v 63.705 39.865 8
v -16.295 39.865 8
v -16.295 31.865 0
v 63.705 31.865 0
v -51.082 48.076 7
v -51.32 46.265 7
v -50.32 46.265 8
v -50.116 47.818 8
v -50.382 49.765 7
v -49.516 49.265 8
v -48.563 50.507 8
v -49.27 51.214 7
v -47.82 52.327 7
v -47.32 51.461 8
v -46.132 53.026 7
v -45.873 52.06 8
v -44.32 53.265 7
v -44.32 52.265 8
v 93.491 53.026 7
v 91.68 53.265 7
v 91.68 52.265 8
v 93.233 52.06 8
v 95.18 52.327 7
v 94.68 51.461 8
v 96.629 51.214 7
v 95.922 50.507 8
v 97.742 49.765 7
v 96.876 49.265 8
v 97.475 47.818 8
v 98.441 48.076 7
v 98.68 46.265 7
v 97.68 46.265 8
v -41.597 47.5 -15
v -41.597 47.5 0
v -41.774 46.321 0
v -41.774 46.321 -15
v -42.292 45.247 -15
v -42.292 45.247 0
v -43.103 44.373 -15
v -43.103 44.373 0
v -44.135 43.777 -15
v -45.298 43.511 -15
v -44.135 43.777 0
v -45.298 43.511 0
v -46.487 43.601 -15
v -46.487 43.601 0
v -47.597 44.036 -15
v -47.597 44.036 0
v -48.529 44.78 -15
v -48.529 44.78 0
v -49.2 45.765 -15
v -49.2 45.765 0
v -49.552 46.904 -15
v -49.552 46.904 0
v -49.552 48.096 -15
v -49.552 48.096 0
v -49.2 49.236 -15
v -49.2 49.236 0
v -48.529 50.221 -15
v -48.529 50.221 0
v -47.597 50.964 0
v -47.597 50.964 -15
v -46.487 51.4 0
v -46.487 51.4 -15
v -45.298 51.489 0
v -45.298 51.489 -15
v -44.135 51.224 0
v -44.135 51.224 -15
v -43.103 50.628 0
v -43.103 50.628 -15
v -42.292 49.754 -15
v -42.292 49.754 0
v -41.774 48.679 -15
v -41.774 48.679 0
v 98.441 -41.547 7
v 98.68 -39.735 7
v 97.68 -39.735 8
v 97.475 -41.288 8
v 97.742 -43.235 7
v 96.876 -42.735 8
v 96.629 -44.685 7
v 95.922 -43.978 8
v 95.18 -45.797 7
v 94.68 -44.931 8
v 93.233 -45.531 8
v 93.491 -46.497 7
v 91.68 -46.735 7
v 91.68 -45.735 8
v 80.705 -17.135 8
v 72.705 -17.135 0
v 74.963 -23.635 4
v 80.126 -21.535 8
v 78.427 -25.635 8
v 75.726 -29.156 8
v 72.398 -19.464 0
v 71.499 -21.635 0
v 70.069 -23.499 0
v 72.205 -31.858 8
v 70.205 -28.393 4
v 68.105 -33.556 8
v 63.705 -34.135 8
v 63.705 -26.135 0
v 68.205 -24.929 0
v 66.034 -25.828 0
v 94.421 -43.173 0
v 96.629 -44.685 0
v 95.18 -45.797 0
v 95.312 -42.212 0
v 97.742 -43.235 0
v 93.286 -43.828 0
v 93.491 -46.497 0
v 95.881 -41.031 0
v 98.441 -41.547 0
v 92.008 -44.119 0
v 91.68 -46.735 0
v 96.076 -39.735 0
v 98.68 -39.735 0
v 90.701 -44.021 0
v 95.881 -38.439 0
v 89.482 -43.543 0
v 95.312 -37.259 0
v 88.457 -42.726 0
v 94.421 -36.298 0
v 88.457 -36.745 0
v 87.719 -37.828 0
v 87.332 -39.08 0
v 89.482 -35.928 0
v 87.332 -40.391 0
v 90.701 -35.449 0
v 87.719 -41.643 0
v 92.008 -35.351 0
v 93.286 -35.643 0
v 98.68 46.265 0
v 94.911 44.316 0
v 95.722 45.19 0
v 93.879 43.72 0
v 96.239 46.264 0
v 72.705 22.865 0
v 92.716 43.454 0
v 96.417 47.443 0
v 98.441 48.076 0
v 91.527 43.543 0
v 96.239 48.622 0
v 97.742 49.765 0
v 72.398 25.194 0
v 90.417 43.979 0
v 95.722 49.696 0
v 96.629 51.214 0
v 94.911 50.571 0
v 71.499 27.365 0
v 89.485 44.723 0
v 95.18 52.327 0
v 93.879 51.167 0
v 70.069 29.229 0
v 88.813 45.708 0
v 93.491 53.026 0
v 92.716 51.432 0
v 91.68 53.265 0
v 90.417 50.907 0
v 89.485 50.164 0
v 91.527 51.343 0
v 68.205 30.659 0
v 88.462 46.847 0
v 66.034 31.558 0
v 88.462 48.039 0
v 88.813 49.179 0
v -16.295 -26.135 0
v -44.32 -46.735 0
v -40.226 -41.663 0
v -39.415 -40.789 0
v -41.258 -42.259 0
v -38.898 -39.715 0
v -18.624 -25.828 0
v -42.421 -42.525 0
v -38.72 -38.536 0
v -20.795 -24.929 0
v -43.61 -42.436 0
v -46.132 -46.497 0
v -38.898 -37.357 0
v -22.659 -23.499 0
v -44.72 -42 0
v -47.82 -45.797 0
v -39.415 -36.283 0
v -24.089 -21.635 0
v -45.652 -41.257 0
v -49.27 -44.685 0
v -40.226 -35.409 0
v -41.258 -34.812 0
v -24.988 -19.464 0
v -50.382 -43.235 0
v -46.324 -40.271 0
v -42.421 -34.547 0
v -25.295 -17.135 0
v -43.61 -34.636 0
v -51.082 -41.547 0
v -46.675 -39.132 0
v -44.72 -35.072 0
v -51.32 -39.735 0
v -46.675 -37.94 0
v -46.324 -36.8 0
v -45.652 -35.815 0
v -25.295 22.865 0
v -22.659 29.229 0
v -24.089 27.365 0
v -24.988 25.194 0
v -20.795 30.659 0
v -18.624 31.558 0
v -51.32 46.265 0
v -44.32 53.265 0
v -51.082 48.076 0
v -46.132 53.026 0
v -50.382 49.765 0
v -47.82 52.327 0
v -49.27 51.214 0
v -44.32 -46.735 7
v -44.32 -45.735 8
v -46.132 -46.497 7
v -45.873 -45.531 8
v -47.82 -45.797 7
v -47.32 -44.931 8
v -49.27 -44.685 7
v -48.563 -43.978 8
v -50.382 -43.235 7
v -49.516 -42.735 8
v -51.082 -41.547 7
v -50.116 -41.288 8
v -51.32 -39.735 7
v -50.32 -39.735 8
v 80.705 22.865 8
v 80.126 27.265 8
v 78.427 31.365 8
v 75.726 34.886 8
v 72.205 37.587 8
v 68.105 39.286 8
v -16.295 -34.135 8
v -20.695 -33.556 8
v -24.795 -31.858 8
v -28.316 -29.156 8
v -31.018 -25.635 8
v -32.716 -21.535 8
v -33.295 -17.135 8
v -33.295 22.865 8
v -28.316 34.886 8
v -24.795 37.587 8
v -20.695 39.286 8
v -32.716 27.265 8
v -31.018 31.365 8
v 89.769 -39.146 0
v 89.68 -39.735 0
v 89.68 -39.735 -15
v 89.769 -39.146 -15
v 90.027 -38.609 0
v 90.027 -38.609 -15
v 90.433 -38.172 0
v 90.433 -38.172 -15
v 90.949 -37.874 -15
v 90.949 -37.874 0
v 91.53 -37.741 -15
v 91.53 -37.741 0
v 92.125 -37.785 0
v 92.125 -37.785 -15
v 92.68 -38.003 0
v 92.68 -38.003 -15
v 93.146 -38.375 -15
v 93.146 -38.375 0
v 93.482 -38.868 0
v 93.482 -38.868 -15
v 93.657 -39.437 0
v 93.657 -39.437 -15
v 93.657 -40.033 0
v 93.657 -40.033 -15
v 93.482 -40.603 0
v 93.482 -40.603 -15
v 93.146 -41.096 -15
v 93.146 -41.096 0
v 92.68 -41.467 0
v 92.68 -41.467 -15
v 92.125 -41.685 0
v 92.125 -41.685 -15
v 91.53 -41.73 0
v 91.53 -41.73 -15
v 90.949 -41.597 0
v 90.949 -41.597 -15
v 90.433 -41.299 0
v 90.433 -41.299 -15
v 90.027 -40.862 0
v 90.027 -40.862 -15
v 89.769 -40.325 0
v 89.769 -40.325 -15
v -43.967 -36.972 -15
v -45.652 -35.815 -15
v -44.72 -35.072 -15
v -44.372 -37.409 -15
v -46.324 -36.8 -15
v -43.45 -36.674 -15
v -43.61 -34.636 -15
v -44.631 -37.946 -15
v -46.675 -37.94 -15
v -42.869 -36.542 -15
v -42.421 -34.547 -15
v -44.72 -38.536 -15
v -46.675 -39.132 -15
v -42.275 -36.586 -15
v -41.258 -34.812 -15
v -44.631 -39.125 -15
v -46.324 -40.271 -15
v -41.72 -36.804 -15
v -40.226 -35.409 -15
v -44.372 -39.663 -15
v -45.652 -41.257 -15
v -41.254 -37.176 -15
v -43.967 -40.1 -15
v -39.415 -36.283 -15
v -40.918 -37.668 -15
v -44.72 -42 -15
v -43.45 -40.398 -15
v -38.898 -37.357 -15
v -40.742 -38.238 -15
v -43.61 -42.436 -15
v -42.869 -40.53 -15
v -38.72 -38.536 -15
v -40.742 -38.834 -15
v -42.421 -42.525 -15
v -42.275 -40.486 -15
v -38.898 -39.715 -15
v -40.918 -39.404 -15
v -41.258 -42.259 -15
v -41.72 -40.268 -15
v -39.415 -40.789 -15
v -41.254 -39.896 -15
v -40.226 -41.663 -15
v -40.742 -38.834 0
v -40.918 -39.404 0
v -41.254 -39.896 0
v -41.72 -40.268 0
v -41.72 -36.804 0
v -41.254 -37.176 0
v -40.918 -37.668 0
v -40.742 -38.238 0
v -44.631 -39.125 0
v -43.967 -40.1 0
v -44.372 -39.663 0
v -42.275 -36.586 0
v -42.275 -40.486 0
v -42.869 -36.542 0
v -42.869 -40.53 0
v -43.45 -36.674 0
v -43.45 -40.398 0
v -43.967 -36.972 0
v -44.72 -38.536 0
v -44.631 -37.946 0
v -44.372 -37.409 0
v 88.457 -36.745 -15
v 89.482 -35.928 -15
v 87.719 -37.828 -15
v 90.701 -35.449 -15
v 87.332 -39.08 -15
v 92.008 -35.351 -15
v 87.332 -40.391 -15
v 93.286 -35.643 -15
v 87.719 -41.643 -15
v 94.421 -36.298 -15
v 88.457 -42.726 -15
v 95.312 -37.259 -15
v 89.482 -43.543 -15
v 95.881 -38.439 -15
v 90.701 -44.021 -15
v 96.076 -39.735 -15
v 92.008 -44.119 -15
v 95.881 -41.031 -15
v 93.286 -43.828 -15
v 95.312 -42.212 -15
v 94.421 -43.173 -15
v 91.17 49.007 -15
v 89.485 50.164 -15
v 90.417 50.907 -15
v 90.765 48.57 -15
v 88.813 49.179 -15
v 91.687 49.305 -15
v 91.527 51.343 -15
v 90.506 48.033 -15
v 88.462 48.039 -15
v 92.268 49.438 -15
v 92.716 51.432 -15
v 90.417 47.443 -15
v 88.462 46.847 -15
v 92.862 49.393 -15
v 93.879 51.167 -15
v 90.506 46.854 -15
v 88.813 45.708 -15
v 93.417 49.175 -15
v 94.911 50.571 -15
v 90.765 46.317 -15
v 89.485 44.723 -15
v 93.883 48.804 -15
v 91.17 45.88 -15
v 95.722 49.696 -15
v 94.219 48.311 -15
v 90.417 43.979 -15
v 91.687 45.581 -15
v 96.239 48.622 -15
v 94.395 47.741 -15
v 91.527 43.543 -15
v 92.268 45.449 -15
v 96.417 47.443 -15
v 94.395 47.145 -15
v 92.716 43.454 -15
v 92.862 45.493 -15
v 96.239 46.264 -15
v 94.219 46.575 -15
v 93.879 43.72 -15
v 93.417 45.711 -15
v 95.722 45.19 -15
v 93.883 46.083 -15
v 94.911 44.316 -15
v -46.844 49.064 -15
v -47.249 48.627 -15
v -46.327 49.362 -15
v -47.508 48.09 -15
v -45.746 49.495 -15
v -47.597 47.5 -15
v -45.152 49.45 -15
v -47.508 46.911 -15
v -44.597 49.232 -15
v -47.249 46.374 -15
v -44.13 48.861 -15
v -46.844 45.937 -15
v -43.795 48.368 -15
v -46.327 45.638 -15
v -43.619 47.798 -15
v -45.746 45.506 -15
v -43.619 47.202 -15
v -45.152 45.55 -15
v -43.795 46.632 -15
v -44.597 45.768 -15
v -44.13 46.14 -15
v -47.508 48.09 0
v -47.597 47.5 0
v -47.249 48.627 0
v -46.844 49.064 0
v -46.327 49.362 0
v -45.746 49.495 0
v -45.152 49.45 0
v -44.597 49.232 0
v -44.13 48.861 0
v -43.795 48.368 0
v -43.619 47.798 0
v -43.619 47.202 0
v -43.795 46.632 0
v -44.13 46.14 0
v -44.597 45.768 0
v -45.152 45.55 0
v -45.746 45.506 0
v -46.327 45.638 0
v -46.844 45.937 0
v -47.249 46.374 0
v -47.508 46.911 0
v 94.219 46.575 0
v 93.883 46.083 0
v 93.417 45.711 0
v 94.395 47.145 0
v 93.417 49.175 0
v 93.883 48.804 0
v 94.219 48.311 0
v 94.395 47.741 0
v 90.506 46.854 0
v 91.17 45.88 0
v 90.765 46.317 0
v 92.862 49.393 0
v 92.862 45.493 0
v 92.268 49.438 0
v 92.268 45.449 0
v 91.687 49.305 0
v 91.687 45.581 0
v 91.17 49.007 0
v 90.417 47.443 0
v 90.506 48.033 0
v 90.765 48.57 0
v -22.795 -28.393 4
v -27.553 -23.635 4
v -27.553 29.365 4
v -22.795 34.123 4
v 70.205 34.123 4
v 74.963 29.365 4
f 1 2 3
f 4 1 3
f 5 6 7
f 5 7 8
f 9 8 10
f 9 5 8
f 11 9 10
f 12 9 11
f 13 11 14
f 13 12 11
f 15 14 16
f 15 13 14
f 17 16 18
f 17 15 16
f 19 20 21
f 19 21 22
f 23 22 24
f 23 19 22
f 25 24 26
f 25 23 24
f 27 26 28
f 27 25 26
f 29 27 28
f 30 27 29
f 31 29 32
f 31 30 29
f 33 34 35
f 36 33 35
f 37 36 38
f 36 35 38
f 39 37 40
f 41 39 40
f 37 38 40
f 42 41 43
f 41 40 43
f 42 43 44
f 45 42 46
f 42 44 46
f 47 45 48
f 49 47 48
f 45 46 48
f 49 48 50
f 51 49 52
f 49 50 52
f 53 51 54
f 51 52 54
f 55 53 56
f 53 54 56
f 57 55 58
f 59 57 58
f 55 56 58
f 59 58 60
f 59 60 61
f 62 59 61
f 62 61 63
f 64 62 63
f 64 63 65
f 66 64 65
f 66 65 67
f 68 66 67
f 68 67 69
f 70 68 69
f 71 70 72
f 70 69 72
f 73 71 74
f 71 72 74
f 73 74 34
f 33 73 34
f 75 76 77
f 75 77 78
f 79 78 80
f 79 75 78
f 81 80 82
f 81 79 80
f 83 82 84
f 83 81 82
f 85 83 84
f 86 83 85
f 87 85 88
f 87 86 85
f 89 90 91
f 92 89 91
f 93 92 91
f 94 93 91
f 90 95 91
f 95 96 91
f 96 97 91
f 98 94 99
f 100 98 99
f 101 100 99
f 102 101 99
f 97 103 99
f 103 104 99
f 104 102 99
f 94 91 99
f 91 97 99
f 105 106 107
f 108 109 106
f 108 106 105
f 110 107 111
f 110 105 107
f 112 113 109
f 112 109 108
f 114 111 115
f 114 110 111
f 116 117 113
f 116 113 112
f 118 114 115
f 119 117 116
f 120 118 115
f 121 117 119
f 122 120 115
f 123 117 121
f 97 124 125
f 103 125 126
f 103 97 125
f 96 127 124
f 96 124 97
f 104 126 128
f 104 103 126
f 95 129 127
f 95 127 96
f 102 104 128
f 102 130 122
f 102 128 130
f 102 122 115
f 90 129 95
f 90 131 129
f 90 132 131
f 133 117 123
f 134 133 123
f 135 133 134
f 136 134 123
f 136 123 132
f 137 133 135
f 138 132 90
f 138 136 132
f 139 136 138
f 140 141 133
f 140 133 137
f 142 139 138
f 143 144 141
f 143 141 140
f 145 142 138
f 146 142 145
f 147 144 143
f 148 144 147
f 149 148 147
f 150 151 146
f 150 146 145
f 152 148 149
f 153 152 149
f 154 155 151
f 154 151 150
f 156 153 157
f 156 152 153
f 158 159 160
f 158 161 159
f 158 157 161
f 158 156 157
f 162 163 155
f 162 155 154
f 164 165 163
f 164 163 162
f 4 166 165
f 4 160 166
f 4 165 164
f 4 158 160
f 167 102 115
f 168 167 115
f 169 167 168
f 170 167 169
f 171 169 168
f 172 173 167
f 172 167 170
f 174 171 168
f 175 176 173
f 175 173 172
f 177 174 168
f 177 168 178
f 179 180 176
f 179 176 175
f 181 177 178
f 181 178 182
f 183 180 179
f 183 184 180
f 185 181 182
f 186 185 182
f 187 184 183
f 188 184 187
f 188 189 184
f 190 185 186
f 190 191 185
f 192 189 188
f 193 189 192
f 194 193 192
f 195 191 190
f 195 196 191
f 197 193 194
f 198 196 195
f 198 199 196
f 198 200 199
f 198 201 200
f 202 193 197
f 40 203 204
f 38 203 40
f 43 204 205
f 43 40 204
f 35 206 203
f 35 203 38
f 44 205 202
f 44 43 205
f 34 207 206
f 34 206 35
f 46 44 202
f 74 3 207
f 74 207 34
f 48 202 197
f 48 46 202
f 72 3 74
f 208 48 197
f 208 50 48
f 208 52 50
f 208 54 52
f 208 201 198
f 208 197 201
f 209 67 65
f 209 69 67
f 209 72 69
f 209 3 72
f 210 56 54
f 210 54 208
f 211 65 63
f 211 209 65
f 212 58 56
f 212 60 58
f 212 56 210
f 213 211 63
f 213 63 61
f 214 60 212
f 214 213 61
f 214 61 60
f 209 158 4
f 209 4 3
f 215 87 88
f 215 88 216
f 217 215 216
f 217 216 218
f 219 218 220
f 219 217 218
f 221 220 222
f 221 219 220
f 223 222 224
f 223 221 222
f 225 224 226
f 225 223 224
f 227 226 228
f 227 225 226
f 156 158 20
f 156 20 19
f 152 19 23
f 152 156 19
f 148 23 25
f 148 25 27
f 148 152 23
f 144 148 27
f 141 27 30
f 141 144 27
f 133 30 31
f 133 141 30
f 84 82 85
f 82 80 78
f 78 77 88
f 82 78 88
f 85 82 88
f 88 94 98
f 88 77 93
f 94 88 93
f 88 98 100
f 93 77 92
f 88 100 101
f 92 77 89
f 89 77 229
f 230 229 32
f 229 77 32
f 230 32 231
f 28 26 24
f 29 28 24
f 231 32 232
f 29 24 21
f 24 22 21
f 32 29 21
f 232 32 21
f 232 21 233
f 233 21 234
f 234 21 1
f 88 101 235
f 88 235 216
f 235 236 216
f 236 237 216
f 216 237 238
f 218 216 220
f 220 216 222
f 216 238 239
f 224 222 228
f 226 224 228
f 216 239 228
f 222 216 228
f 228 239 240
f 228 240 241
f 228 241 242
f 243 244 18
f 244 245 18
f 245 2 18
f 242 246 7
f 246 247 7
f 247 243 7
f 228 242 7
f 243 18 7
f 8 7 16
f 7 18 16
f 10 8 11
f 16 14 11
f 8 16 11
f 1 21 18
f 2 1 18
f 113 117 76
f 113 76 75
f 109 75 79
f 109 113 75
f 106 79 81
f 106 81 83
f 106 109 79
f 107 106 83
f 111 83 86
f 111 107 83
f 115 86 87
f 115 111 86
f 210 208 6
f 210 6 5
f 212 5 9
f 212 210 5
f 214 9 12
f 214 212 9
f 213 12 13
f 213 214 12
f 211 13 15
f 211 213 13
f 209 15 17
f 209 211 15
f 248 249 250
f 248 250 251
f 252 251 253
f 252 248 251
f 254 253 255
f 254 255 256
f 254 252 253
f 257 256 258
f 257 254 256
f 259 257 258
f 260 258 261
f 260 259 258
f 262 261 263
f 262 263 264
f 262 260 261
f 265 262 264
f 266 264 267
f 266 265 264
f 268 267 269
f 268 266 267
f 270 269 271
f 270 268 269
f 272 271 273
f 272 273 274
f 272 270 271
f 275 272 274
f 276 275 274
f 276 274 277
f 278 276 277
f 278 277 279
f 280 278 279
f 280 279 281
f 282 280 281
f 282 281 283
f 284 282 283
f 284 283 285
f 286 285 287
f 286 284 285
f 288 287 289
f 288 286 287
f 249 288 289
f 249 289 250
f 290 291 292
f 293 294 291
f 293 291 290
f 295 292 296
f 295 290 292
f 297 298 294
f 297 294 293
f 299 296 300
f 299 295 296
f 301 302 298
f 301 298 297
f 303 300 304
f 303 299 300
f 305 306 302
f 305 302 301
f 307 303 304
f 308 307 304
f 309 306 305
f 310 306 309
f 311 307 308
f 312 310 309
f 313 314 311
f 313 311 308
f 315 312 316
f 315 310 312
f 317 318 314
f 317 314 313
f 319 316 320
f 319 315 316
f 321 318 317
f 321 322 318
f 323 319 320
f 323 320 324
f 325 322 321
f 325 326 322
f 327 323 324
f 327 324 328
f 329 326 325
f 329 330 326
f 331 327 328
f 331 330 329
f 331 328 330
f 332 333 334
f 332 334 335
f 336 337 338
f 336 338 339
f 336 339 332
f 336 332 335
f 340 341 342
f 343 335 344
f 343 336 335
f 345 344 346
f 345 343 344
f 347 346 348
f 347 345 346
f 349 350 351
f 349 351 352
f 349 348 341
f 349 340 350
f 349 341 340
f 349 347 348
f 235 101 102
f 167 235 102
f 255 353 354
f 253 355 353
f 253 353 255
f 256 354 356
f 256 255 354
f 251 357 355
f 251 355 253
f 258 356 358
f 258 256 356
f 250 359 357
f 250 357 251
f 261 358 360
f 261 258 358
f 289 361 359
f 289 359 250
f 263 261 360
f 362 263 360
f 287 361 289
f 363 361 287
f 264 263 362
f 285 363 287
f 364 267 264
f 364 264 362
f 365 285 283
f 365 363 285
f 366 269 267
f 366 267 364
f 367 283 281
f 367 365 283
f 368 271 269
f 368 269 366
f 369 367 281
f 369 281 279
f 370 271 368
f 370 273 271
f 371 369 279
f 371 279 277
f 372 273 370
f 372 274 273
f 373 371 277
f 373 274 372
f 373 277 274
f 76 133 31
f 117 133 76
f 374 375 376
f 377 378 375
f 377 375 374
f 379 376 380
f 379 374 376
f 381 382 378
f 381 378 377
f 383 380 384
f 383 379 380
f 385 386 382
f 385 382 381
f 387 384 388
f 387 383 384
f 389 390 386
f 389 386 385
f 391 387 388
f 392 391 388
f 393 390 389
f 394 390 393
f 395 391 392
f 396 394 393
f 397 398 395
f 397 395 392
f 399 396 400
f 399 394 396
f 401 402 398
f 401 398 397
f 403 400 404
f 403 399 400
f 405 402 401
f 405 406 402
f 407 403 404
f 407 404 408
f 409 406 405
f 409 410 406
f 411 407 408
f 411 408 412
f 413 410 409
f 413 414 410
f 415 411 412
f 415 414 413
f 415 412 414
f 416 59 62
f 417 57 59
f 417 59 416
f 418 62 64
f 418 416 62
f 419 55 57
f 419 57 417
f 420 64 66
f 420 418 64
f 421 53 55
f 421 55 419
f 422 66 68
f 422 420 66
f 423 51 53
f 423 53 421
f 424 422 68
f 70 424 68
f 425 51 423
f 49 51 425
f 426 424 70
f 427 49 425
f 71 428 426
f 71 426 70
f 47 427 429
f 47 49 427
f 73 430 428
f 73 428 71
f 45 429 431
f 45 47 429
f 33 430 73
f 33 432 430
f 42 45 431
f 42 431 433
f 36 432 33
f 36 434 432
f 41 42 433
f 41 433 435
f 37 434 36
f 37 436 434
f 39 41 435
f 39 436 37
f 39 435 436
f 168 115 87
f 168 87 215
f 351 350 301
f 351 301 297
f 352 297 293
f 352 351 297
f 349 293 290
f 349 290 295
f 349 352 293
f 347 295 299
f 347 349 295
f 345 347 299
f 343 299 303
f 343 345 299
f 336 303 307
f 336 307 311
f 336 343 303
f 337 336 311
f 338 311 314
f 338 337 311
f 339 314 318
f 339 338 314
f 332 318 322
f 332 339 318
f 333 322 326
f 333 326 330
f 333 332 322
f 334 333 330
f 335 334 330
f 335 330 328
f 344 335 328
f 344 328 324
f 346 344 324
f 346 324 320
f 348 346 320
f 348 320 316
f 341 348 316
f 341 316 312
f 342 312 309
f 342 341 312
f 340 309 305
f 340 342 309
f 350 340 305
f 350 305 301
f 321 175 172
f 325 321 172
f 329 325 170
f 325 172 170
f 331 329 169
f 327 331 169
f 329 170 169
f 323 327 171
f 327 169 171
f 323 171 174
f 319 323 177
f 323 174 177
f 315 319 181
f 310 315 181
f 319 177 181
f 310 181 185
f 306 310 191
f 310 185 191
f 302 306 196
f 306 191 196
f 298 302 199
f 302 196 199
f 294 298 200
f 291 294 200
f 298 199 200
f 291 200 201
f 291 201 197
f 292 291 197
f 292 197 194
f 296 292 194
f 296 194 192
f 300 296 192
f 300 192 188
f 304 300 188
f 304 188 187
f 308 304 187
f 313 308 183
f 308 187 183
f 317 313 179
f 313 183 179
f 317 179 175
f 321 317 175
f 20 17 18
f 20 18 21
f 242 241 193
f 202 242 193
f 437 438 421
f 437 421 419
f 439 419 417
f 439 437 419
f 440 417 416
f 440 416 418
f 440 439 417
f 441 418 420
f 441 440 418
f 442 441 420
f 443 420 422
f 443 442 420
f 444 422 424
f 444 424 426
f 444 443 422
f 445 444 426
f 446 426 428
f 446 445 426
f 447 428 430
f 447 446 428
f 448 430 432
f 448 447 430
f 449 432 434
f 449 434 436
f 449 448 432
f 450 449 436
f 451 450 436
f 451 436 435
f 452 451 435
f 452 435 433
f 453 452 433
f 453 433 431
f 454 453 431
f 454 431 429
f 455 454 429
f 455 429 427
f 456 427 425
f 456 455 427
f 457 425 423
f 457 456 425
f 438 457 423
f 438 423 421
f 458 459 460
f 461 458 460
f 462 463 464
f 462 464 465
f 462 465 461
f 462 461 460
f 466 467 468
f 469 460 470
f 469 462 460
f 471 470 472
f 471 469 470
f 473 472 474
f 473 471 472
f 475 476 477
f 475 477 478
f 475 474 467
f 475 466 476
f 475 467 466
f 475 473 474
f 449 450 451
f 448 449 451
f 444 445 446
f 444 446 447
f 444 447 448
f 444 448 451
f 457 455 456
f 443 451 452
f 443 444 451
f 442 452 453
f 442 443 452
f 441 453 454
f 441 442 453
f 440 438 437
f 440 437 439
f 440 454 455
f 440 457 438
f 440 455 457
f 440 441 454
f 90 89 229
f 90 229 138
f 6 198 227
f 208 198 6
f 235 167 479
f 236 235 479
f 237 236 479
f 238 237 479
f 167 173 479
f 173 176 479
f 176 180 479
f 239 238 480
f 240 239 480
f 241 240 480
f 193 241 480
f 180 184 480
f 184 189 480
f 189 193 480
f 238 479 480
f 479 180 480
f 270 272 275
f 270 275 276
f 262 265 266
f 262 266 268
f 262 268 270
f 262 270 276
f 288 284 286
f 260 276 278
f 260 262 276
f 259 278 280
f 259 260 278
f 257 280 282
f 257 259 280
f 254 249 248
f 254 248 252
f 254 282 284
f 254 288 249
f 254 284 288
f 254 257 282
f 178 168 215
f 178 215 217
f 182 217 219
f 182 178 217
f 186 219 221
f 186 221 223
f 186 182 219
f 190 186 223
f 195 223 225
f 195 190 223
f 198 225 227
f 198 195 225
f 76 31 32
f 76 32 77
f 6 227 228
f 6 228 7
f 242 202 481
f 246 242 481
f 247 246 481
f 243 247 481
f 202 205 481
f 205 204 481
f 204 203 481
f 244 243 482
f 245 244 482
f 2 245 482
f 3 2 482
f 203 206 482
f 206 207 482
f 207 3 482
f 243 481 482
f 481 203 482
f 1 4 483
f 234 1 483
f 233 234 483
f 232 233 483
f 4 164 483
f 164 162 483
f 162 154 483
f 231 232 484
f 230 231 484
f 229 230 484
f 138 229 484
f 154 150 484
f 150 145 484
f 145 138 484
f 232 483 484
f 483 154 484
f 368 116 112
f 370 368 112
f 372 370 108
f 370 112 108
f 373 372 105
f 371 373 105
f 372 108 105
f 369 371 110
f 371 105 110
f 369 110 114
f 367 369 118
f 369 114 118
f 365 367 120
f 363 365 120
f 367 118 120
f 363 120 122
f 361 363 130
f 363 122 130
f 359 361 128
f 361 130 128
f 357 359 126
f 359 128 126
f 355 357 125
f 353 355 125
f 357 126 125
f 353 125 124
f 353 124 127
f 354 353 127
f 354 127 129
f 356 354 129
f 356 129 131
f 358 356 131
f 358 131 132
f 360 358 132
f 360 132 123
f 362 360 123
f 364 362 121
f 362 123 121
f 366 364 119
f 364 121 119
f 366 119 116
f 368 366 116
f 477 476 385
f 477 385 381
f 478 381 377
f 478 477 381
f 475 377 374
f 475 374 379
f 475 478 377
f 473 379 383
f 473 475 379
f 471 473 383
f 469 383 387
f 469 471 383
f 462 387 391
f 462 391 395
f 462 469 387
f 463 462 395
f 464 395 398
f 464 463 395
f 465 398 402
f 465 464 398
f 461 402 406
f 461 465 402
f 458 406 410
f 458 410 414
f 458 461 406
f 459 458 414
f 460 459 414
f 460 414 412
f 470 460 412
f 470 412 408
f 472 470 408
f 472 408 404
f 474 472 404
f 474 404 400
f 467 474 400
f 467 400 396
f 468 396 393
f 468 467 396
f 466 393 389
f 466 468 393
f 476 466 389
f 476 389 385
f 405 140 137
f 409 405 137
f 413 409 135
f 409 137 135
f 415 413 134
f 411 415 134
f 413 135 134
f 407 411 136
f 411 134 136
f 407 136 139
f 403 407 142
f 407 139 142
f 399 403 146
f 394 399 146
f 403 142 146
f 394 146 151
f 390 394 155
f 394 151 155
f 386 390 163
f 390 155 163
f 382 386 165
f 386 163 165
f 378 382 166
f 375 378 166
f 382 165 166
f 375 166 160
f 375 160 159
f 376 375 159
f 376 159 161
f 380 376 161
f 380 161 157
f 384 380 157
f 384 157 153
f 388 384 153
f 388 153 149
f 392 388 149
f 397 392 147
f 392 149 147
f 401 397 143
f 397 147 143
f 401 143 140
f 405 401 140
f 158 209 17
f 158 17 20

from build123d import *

# Parameters (mm, degrees)
EXTRUDE_1_DEPTH     = 8
CUT_EXTRUDE_1_DEPTH = 8
CHAMFER_2_SIZE      = 1
SKETCH_3_R          = 4
SKETCH_3_R_2        = 2
EXTRUDE_3_DEPTH     = 15
SKETCH_5_R          = 4.396393258
SKETCH_5_R_2        = 2
EXTRUDE_4_DEPTH     = 15
SKETCH_9_R          = 4
SKETCH_9_R_2        = 2
EXTRUDE_5_DEPTH     = 15
SKETCH_10_R         = 4
SKETCH_10_R_2       = 2
EXTRUDE_6_DEPTH     = 15
CHAMFER_6_SIZE      = 10


with BuildPart() as part:
    # 草图1 → 凸台-拉伸1 (new body)
    with BuildSketch(Plane.XY):
        with BuildLine():
            Line((-44.320266629, 53.264700042), (91.679733371, 53.264700042))
            ThreePointArc((91.679733371, 53.264700042), (96.629480839, 51.21444751), (98.679733371, 46.264700042))
            Line((98.679733371, 46.264700042), (98.679733371, -39.735299958))
            ThreePointArc((98.679733371, -39.735299958), (96.629480839, -44.685047426), (91.679733371, -46.735299958))
            Line((91.679733371, -46.735299958), (-44.320266629, -46.735299958))
            ThreePointArc((-44.320266629, -46.735299958), (-49.270014098, -44.685047426), (-51.320266629, -39.735299958))
            Line((-51.320266629, -39.735299958), (-51.320266629, 46.264700042))
            ThreePointArc((-51.320266629, 46.264700042), (-49.270014098, 51.21444751), (-44.320266629, 53.264700042))
        make_face()
    extrude(amount=EXTRUDE_1_DEPTH)

    # 草图2 → 切除-拉伸1 (cut)
    with BuildSketch(Plane.XY.offset(8)):
        with BuildLine():
            Line((-16.295074043, 29.864928603), (63.704925957, 29.864928603))
            ThreePointArc((63.704925957, 29.864928603), (68.654673426, 27.814676072), (70.704925957, 22.864928603))
            Line((70.704925957, 22.864928603), (70.704925957, -17.135071397))
            ThreePointArc((70.704925957, -17.135071397), (68.654673426, -22.084818865), (63.704925957, -24.135071397))
            Line((63.704925957, -24.135071397), (-16.295074043, -24.135071397))
            ThreePointArc((-16.295074043, -24.135071397), (-21.244821511, -22.084818865), (-23.295074043, -17.135071397))
            Line((-23.295074043, -17.135071397), (-23.295074043, 22.864928603))
            ThreePointArc((-23.295074043, 22.864928603), (-21.244821511, 27.814676072), (-16.295074043, 29.864928603))
        make_face()
    extrude(amount=-CUT_EXTRUDE_1_DEPTH, mode=Mode.SUBTRACT)

    # 倒角2
    chamfer_2_edges = [part.edges().sort_by_distance(p)[0] for p in [
        (96.629480839, -44.685047426, 8),
        (98.679733371, 3.264700042, 8),
        (96.629480839, 51.21444751, 8),
        (23.679733371, 53.264700042, 8),
        (-49.270014098, 51.21444751, 8),
        (-51.320266629, 3.264700042, 8),
        (-49.270014098, -44.685047426, 8),
        (23.679733371, -46.735299958, 8),
    ]]
    chamfer(chamfer_2_edges, length=CHAMFER_2_SIZE)

    # 草图3 → 凸台-拉伸3 (add)
    with BuildSketch(Plane(origin=(0, 0, 0), x_dir=(-1, 0, 0), z_dir=(0, 0, -1))):
        with Locations(Location((-92.417207429, 47.443208316, 0), (0, 0, 180))):
            Circle(SKETCH_3_R)
        with Locations((-92.417207429, 47.443208316)):
            Circle(SKETCH_3_R_2, mode=Mode.SUBTRACT)
    extrude(amount=EXTRUDE_3_DEPTH)

    # 草图5 → 凸台-拉伸4 (add)
    with BuildSketch(Plane(origin=(0, 0, 0), x_dir=(-1, 0, 0), z_dir=(0, 0, -1))):
        with Locations(Location((-91.679733371, -39.735299958, 0), (0, 0, 180))):
            Circle(SKETCH_5_R)
        with Locations((-91.679733371, -39.735299958)):
            Circle(SKETCH_5_R_2, mode=Mode.SUBTRACT)
    extrude(amount=EXTRUDE_4_DEPTH)

    # 草图9 → 凸台-拉伸5 (add)
    with BuildSketch(Plane(origin=(0, 0, 0), x_dir=(-1, 0, 0), z_dir=(0, 0, -1))):
        with Locations(Location((45.596569925, 47.500240672, 0), (0, 0, 180))):
            Circle(SKETCH_9_R)
        with Locations((45.596569925, 47.500240672)):
            Circle(SKETCH_9_R_2, mode=Mode.SUBTRACT)
    extrude(amount=EXTRUDE_5_DEPTH)

    # 草图10 → 凸台-拉伸6 (add)
    with BuildSketch(Plane(origin=(0, 0, 0), x_dir=(-1, 0, 0), z_dir=(0, 0, -1))):
        with Locations(Location((42.719793233, -38.535931412, 0), (0, 0, 180))):
            Circle(SKETCH_10_R)
        with Locations((42.719793233, -38.535931412)):
            Circle(SKETCH_10_R_2, mode=Mode.SUBTRACT)
    extrude(amount=EXTRUDE_6_DEPTH)

    # 倒角6
    # the kernel refuses this chamfer: 10 mm, written as the material it takes off along each edge
    with BuildSketch(Plane(origin=(63.704925957, -24.135071397, 8), x_dir=(0, -0.9996219169112968, 0.027495876610586317), z_dir=(-1, 0, 0)), Plane(origin=(-16.295074043, 29.864928603, 8), x_dir=(0, 0.9996219169112968, 0.027495876610586317), z_dir=(1, 0, 0))) as chamfer_6_piece_1:
        Polygon((CHAMFER_6_SIZE * 0.999621916911, -CHAMFER_6_SIZE * 0.0274958766106), (-CHAMFER_6_SIZE * 0.0274958766106, -CHAMFER_6_SIZE * 0.999621916911), (0, 0), align=None)
    extrude(amount=80, mode=Mode.SUBTRACT)
    with BuildSketch(Plane(origin=(63.704925957, -17.135071397, 8), x_dir=(1, 0, 0), z_dir=(0, 1, 0))) as chamfer_6_piece_2:
        Polygon((7 + CHAMFER_6_SIZE, 0), (7, CHAMFER_6_SIZE), (7, 0), align=None)
    revolve(axis=Axis((63.704925957, -17.135071397, 8), (0, 0, -1)), revolution_arc=90, mode=Mode.SUBTRACT)
    with BuildSketch(Plane(origin=(70.704925957, 22.864928603, 8), x_dir=(0.9996219169112968, 0, 0.027495876610586317), z_dir=(0, -1, 0)), Plane(origin=(-23.295074043, -17.135071397, 8), x_dir=(-0.9996219169112968, 0, 0.02749587661058631), z_dir=(0, 1, 0))) as chamfer_6_piece_3:
        Polygon((CHAMFER_6_SIZE * 0.999621916911, -CHAMFER_6_SIZE * 0.0274958766106), (-CHAMFER_6_SIZE * 0.0274958766106, -CHAMFER_6_SIZE * 0.999621916911), (0, 0), align=None)
    extrude(amount=40, mode=Mode.SUBTRACT)
    with BuildSketch(Plane(origin=(63.704925957, 22.864928603, 8), x_dir=(0, 1, 0), z_dir=(-1, 0, 0))) as chamfer_6_piece_4:
        Polygon((7 + CHAMFER_6_SIZE, 0), (7, CHAMFER_6_SIZE), (7, 0), align=None)
    revolve(axis=Axis((63.704925957, 22.864928603, 8), (0, 0, -1)), revolution_arc=90, mode=Mode.SUBTRACT)
    with BuildSketch(Plane(origin=(-16.295074043, -17.135071397, 8), x_dir=(0, -1, 0), z_dir=(1, 0, 0))) as chamfer_6_piece_5:
        Polygon((7 + CHAMFER_6_SIZE, 0), (7, CHAMFER_6_SIZE), (7, 0), align=None)
    revolve(axis=Axis((-16.295074043, -17.135071397, 8), (0, 0, -1)), revolution_arc=90, mode=Mode.SUBTRACT)
    with BuildSketch(Plane(origin=(-16.295074043, 22.864928603, 8), x_dir=(-1, 0, 0), z_dir=(0, -1, 0))) as chamfer_6_piece_6:
        Polygon((7 + CHAMFER_6_SIZE, 0), (7, CHAMFER_6_SIZE), (7, 0), align=None)
    revolve(axis=Axis((-16.295074043, 22.864928603, 8), (0, 0, -1)), revolution_arc=90, mode=Mode.SUBTRACT)


solid = part.part
